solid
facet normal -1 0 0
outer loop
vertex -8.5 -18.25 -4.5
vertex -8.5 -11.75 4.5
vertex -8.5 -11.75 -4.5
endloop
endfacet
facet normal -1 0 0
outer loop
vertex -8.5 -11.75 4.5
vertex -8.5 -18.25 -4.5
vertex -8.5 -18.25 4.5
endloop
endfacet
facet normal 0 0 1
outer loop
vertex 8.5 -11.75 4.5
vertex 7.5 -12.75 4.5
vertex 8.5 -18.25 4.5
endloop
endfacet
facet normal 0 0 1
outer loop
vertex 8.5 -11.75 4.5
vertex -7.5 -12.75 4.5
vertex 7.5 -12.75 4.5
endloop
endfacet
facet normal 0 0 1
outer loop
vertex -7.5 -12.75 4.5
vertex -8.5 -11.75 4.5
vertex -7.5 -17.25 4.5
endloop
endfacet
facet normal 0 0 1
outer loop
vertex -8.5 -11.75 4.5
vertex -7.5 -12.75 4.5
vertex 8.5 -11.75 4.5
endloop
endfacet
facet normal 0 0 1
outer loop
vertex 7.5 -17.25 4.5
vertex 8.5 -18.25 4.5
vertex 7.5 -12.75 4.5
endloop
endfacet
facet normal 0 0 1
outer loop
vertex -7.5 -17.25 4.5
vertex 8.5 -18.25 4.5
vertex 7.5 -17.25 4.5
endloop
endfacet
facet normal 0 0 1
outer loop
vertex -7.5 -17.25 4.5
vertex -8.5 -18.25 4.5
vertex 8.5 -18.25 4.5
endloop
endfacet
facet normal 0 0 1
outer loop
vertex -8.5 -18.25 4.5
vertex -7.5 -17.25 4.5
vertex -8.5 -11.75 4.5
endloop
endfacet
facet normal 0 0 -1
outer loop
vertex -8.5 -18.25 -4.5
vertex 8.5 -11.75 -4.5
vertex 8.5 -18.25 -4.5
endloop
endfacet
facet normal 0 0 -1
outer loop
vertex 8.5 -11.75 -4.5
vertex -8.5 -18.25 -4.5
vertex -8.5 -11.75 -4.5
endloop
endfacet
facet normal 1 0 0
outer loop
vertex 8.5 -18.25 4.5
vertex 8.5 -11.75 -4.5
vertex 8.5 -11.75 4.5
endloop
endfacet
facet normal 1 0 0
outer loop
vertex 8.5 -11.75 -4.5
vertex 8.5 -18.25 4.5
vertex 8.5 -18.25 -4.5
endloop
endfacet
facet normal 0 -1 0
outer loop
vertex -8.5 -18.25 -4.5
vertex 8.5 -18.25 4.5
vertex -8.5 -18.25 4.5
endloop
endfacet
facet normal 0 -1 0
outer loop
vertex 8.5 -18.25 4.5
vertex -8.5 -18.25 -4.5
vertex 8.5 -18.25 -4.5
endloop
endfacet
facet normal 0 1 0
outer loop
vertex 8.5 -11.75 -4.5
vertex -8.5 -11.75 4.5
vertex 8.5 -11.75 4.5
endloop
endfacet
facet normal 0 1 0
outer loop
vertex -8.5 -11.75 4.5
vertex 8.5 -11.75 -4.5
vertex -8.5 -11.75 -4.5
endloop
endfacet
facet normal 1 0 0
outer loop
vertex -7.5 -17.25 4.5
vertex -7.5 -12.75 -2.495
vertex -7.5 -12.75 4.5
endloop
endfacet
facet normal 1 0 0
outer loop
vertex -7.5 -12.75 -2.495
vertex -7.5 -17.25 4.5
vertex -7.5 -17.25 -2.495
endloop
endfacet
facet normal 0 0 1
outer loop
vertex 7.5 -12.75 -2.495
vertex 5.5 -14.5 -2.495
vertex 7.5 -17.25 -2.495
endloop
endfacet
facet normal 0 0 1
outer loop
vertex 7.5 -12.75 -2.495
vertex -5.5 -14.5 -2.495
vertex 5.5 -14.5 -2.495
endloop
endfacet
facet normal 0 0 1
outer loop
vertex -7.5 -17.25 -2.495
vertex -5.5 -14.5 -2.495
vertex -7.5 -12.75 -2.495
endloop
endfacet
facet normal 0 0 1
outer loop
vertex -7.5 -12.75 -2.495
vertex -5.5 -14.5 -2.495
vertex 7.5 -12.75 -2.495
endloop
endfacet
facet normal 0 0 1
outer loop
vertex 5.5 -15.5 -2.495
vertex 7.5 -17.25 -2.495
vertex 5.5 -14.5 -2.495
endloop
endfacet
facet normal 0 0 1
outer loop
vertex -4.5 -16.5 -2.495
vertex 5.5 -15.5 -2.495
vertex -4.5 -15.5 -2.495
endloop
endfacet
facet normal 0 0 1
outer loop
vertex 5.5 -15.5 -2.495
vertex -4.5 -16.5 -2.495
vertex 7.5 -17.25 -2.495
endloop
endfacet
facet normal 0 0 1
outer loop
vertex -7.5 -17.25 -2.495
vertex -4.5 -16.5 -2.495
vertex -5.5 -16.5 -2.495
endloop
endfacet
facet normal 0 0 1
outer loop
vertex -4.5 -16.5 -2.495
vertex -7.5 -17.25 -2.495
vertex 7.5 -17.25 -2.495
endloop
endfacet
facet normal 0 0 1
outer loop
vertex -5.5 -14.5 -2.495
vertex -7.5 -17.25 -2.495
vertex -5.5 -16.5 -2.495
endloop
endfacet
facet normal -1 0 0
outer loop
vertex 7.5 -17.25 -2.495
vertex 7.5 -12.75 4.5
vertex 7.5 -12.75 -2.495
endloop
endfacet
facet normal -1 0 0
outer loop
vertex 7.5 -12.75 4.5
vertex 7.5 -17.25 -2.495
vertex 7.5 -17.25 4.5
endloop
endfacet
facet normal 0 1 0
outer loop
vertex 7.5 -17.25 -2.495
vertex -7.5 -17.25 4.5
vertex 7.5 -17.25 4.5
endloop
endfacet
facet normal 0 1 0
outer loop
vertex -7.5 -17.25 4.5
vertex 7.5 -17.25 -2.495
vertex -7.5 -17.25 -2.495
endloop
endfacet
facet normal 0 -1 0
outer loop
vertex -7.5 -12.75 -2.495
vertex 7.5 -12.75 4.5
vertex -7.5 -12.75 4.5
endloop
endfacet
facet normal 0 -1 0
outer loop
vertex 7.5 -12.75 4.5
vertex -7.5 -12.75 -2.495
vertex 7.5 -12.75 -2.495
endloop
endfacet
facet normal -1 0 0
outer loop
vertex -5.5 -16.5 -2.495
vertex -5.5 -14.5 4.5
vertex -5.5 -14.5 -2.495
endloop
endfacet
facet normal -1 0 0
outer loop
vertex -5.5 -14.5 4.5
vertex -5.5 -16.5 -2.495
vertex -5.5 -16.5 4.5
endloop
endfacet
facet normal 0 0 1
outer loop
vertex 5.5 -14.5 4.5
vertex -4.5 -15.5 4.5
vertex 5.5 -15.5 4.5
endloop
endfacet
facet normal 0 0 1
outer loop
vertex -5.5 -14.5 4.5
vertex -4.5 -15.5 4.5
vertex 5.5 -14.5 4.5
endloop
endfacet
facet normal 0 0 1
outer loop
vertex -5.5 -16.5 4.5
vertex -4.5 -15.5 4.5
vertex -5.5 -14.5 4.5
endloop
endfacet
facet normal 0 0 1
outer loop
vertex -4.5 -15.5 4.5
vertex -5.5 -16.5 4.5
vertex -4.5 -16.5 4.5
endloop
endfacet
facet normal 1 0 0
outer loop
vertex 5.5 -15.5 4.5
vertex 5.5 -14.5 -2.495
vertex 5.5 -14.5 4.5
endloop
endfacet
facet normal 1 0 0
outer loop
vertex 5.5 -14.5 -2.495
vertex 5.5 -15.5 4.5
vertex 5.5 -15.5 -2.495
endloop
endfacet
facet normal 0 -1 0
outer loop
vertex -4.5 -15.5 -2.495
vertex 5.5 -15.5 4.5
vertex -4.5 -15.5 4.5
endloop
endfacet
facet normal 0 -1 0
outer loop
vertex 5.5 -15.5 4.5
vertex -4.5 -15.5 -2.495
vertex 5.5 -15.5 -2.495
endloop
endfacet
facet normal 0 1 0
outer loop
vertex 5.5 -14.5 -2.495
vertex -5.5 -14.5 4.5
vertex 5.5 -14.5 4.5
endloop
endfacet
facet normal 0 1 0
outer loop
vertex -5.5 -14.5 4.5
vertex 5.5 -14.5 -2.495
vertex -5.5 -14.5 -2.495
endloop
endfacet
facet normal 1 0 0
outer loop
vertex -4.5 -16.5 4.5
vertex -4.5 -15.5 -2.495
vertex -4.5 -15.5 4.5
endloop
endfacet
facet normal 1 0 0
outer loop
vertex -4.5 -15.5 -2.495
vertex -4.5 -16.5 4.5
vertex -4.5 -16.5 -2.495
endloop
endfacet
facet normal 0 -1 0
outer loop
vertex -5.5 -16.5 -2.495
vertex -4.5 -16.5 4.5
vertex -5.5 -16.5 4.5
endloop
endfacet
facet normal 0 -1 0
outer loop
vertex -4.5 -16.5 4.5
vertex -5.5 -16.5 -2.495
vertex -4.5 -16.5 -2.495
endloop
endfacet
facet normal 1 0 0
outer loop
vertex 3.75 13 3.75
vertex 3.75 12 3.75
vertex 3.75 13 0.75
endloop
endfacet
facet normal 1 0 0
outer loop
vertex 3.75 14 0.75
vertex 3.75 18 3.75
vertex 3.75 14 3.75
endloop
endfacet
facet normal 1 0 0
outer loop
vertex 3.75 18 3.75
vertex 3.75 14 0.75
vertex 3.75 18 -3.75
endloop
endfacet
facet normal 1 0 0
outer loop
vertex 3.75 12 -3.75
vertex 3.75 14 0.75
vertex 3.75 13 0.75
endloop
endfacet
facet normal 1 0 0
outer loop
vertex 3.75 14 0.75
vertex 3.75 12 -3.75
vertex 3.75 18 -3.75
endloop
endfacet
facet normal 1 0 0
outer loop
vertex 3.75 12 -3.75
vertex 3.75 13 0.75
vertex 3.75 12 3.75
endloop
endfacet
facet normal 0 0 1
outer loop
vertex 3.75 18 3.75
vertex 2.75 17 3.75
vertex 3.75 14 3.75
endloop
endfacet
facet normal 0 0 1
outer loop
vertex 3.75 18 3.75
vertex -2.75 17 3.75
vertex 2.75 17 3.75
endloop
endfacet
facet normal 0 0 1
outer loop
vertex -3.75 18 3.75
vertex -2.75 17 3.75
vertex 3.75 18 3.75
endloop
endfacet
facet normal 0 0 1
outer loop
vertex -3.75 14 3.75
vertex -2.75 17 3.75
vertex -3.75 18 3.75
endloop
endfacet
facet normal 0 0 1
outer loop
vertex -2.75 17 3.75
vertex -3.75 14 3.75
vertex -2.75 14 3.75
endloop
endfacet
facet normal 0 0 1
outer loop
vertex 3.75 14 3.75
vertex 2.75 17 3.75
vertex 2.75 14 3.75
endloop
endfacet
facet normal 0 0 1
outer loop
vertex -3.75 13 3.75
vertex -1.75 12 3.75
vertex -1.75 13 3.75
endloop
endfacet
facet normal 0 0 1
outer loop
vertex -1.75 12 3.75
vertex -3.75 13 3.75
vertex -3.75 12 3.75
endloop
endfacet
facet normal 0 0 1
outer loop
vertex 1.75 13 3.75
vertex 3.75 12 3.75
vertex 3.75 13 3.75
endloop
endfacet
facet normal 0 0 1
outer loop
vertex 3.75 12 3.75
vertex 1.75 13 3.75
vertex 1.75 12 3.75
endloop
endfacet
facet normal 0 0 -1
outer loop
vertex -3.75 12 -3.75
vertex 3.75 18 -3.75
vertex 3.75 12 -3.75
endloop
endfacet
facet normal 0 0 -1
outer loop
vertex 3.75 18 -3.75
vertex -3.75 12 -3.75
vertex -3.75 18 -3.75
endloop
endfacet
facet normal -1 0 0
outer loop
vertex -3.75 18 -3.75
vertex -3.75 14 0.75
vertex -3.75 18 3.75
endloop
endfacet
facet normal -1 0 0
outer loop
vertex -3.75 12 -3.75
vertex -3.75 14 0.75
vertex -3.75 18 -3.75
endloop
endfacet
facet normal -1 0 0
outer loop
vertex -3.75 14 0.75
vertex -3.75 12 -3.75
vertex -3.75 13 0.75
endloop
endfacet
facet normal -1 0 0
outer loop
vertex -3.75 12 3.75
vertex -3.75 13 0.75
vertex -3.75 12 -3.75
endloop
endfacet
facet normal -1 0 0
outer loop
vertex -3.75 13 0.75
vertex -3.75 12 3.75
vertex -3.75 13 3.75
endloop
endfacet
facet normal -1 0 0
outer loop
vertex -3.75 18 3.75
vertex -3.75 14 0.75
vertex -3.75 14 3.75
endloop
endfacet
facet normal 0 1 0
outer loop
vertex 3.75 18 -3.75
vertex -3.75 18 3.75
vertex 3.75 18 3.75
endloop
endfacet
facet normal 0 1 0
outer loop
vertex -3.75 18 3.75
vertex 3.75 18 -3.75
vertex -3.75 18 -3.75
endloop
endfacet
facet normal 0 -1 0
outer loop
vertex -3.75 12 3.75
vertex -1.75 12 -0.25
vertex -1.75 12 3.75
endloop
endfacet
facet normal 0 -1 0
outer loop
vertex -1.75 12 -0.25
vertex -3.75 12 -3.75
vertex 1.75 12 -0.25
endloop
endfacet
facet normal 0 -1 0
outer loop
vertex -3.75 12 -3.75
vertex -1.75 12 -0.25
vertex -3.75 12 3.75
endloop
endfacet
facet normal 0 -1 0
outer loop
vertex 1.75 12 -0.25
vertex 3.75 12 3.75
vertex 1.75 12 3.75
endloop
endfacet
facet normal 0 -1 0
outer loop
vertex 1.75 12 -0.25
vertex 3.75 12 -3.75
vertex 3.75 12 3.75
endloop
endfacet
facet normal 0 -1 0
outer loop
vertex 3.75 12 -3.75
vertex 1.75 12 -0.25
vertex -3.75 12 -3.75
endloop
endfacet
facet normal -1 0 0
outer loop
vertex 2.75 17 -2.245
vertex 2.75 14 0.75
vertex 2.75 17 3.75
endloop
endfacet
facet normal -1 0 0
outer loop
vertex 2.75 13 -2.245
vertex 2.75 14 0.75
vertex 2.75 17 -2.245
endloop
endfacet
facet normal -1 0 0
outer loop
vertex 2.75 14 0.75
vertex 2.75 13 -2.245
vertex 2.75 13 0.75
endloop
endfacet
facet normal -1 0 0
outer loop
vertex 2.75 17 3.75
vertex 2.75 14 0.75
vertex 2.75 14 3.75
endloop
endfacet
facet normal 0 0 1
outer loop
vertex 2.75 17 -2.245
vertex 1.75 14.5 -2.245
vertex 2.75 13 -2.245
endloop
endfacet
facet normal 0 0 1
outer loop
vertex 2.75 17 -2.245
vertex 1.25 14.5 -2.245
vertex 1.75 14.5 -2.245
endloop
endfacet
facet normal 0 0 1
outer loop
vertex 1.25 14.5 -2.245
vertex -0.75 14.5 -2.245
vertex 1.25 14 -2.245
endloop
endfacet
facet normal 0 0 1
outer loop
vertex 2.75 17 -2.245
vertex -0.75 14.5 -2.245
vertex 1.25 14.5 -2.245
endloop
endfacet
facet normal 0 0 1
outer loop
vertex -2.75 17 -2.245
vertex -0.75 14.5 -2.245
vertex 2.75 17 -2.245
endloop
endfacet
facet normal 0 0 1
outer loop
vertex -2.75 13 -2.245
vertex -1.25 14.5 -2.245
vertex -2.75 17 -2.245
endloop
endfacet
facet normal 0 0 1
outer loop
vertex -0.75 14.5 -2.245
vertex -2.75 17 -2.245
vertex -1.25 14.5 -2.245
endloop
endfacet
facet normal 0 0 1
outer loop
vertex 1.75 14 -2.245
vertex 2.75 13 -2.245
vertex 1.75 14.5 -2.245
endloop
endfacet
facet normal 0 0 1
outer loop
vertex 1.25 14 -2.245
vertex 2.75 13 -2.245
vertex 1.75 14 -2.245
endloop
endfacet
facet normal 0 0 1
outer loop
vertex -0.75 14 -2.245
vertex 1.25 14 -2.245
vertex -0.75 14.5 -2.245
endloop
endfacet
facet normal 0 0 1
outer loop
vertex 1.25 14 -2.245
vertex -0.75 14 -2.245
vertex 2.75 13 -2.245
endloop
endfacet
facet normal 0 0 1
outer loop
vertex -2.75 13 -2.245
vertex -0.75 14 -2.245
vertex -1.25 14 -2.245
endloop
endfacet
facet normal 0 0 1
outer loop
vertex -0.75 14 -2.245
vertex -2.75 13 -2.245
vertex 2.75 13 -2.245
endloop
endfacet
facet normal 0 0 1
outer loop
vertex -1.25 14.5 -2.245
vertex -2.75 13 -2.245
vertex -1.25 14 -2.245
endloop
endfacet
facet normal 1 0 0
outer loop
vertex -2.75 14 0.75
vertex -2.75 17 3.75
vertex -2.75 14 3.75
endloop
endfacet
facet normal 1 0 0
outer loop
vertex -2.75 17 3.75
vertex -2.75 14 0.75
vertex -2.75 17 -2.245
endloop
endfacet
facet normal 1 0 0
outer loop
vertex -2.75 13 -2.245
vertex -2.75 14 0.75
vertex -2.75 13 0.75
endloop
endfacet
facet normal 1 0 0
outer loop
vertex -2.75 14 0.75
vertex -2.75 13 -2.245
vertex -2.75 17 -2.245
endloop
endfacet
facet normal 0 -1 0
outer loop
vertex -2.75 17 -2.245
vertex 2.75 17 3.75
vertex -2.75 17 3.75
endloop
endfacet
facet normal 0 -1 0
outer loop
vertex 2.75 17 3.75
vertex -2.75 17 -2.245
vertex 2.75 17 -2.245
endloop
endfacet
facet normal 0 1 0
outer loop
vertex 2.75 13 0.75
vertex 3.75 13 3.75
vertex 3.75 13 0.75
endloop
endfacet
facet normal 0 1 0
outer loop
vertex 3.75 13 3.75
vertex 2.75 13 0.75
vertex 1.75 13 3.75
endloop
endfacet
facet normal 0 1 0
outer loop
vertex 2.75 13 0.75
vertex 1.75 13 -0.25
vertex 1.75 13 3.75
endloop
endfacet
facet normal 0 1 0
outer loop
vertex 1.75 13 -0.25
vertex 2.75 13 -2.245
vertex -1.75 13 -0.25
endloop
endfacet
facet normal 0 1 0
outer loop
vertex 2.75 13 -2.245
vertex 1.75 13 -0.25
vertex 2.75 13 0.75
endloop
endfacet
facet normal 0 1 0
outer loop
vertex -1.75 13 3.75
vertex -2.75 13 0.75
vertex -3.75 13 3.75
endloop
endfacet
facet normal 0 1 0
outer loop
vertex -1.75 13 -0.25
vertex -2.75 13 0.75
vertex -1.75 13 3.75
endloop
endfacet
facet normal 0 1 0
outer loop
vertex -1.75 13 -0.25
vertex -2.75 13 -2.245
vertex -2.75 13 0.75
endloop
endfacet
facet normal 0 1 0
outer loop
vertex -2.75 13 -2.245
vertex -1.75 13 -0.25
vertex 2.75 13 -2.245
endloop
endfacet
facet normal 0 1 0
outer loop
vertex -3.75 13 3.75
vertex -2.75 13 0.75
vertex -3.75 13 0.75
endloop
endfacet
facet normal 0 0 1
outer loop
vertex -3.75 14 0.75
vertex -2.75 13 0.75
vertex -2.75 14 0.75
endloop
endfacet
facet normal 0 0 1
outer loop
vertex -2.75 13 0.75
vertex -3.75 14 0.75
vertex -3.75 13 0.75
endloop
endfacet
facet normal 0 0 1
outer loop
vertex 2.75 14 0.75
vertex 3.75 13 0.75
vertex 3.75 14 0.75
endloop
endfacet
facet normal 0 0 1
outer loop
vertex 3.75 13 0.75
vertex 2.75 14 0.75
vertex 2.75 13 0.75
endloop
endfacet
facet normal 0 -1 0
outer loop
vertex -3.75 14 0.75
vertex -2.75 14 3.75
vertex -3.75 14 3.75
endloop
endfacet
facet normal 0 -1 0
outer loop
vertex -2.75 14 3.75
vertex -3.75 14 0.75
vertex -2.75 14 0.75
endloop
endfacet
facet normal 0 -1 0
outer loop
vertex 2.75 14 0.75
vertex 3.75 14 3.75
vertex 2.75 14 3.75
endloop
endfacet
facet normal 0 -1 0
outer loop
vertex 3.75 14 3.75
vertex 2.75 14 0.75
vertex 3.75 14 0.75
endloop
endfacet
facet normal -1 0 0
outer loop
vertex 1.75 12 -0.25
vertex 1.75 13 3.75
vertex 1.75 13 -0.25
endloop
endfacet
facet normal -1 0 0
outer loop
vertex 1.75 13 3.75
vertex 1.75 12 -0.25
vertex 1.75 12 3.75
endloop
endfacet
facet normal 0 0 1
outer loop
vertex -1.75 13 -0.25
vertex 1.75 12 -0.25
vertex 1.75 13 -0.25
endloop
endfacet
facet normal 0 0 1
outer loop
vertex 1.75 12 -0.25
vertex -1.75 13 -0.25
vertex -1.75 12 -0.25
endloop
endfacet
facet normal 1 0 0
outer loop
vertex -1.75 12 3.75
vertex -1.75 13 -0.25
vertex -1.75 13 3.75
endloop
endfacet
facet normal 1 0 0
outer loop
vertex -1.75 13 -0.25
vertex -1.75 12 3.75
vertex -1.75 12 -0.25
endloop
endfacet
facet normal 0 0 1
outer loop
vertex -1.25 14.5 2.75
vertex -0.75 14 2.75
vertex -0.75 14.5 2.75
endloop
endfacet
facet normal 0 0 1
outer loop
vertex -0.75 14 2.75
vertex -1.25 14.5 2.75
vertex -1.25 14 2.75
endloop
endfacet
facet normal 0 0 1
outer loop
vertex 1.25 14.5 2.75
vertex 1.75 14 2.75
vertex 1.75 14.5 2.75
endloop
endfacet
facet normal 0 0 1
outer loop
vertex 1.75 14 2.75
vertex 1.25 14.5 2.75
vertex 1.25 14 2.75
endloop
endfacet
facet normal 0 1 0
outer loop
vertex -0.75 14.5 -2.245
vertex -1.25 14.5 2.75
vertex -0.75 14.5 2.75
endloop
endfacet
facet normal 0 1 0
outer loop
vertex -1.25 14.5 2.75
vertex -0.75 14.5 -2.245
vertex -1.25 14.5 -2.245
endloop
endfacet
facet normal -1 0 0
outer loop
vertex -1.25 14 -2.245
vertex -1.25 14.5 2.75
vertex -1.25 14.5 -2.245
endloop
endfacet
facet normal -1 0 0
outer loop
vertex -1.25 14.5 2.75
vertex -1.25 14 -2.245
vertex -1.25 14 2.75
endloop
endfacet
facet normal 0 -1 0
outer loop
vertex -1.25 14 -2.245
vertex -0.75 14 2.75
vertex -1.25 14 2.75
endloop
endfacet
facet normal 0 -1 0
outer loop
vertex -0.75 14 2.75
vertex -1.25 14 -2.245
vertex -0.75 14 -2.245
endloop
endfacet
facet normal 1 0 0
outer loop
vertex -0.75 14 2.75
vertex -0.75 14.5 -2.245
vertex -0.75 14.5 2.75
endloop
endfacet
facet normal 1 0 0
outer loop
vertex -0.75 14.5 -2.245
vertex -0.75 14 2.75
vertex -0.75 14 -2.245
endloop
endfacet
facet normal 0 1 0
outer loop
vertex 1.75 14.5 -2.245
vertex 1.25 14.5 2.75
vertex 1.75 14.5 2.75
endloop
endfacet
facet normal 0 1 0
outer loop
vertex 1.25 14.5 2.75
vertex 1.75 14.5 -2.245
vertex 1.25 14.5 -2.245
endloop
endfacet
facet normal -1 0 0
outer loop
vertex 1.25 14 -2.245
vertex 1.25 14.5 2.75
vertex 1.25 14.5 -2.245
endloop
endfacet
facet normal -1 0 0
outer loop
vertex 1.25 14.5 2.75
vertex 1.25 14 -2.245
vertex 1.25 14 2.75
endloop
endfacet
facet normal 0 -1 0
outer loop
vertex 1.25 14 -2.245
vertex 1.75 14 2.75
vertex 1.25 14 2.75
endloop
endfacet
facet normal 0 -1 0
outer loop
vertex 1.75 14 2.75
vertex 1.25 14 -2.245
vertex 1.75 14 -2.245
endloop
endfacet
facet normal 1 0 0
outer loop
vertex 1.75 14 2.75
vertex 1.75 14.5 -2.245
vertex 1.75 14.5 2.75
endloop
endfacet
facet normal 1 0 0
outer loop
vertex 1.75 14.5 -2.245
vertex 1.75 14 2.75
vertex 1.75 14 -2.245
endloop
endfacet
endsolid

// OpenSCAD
// file: ../globals.scad
// Copyright (c) 2017 Clément Bœsch <u pkh.me>
//
// Permission to use, copy, modify, and distribute this software for any
// purpose with or without fee is hereby granted, provided that the above
// copyright notice and this permission notice appear in all copies.
//
// THE SOFTWARE IS PROVIDED "AS IS" AND THE AUTHOR DISCLAIMS ALL WARRANTIES
// WITH REGARD TO THIS SOFTWARE INCLUDING ALL IMPLIED WARRANTIES OF
// MERCHANTABILITY AND FITNESS. IN NO EVENT SHALL THE AUTHOR BE LIABLE FOR
// ANY SPECIAL, DIRECT, INDIRECT, OR CONSEQUENTIAL DAMAGES OR ANY DAMAGES
// WHATSOEVER RESULTING FROM LOSS OF USE, DATA OR PROFITS, WHETHER IN AN
// ACTION OF CONTRACT, NEGLIGENCE OR OTHER TORTIOUS ACTION, ARISING OUT OF
// OR IN CONNECTION WITH THE USE OR PERFORMANCE OF THIS SOFTWARE.

$fn = 30;

_delta = 0.005;

c_black        = [.17,.17,.17];
c_black_redish = [.35,.30,.30];
c_gold         = [.75,.55,.00];
c_gray         = [.40,.40,.40];
c_darkgray     = [.25,.25,.25];
c_green_pcb    = [.00,.50,.25];
c_metal        = [.70,.70,.70];
c_yellow       = [.70,.70,.30];
c_darkblue     = [.20,.30,.40];
// file: _internal.scad
// Copyright (c) 2017 Clément Bœsch <u pkh.me>
//
// Permission to use, copy, modify, and distribute this software for any
// purpose with or without fee is hereby granted, provided that the above
// copyright notice and this permission notice appear in all copies.
//
// THE SOFTWARE IS PROVIDED "AS IS" AND THE AUTHOR DISCLAIMS ALL WARRANTIES
// WITH REGARD TO THIS SOFTWARE INCLUDING ALL IMPLIED WARRANTIES OF
// MERCHANTABILITY AND FITNESS. IN NO EVENT SHALL THE AUTHOR BE LIABLE FOR
// ANY SPECIAL, DIRECT, INDIRECT, OR CONSEQUENTIAL DAMAGES OR ANY DAMAGES
// WHATSOEVER RESULTING FROM LOSS OF USE, DATA OR PROFITS, WHETHER IN AN
// ACTION OF CONTRACT, NEGLIGENCE OR OTHER TORTIOUS ACTION, ARISING OUT OF
// OR IN CONNECTION WITH THE USE OR PERFORMANCE OF THIS SOFTWARE.

include <../globals.scad>

$vpr = [50, 0, 90];

module components_demo(pad=30) {
    n = $children;
    cols = ceil(sqrt(n));
    rows = ceil(n / cols);
    offx = pad * (rows - 1) / 2;
    offy = pad * (cols - 1) / 2;
    for (i = [0:n-1]) {
        x = floor(i / cols);
        y = i % cols;
        translate([x*pad - offx, y*pad - offy])
            rotate(360 * $t)
                children(i);
    }
}
// main file
// Copyright (c) 2017 Clément Bœsch <u pkh.me>
//
// Permission to use, copy, modify, and distribute this software for any
// purpose with or without fee is hereby granted, provided that the above
// copyright notice and this permission notice appear in all copies.
//
// THE SOFTWARE IS PROVIDED "AS IS" AND THE AUTHOR DISCLAIMS ALL WARRANTIES
// WITH REGARD TO THIS SOFTWARE INCLUDING ALL IMPLIED WARRANTIES OF
// MERCHANTABILITY AND FITNESS. IN NO EVENT SHALL THE AUTHOR BE LIABLE FOR
// ANY SPECIAL, DIRECT, INDIRECT, OR CONSEQUENTIAL DAMAGES OR ANY DAMAGES
// WHATSOEVER RESULTING FROM LOSS OF USE, DATA OR PROFITS, WHETHER IN AN
// ACTION OF CONTRACT, NEGLIGENCE OR OTHER TORTIOUS ACTION, ARISING OUT OF
// OR IN CONNECTION WITH THE USE OR PERFORMANCE OF THIS SOFTWARE.

include <_internal.scad>

$vpd = 150;

module sata_data(dim=[17, 6.5, 9]) {
    rotate([0,0,180]) translate(dim * -.5)
    color(c_black) {
        difference() {
            cube(dim);
            translate([1, 1, 2+_delta])
                cube([dim[0]-2, dim[1]-2, dim[2]-2]);
        }
        translate([3, (dim[1]-1)/2])
            cube([dim[0]-3*2, 1, dim[2]]);
        translate([dim[0]-4, (dim[1]-1)/2+1])
            cube([1, 1, dim[2]]);

    }
}

module sata_5v(dim=[7.5, 6, 7.5]) {
    translate(dim * -.5) { // XXX
    color("white") {
        difference() {
            cube(dim);
            translate([1, 1, dim[2] - 6 + _delta])
                cube([dim[0]-2, dim[1]-2, 6]);
            translate([-_delta/2, 1, dim[2]-3])
                cube([dim[0]+_delta, 1, 3+_delta]);
            translate([2, -_delta/2, dim[2]-4])
                cube([dim[0]-4, 1+_delta, 4+_delta]);
        }
    }
    color(c_metal)
        linear_extrude(height=dim[2]-1)
            for (i = [1:2])
                translate([i*dim[0]/3, dim[1]/3])
                    square(.5);
    }
}

function sata_data_info() = [
    ["category", "sata"],
    ["watch", "sky"],
];

function sata_5v_info() = [
    ["category", "sata"],
    ["watch", "sky"],
];

components_demo() {
    sata_data();
    sata_5v();
}
